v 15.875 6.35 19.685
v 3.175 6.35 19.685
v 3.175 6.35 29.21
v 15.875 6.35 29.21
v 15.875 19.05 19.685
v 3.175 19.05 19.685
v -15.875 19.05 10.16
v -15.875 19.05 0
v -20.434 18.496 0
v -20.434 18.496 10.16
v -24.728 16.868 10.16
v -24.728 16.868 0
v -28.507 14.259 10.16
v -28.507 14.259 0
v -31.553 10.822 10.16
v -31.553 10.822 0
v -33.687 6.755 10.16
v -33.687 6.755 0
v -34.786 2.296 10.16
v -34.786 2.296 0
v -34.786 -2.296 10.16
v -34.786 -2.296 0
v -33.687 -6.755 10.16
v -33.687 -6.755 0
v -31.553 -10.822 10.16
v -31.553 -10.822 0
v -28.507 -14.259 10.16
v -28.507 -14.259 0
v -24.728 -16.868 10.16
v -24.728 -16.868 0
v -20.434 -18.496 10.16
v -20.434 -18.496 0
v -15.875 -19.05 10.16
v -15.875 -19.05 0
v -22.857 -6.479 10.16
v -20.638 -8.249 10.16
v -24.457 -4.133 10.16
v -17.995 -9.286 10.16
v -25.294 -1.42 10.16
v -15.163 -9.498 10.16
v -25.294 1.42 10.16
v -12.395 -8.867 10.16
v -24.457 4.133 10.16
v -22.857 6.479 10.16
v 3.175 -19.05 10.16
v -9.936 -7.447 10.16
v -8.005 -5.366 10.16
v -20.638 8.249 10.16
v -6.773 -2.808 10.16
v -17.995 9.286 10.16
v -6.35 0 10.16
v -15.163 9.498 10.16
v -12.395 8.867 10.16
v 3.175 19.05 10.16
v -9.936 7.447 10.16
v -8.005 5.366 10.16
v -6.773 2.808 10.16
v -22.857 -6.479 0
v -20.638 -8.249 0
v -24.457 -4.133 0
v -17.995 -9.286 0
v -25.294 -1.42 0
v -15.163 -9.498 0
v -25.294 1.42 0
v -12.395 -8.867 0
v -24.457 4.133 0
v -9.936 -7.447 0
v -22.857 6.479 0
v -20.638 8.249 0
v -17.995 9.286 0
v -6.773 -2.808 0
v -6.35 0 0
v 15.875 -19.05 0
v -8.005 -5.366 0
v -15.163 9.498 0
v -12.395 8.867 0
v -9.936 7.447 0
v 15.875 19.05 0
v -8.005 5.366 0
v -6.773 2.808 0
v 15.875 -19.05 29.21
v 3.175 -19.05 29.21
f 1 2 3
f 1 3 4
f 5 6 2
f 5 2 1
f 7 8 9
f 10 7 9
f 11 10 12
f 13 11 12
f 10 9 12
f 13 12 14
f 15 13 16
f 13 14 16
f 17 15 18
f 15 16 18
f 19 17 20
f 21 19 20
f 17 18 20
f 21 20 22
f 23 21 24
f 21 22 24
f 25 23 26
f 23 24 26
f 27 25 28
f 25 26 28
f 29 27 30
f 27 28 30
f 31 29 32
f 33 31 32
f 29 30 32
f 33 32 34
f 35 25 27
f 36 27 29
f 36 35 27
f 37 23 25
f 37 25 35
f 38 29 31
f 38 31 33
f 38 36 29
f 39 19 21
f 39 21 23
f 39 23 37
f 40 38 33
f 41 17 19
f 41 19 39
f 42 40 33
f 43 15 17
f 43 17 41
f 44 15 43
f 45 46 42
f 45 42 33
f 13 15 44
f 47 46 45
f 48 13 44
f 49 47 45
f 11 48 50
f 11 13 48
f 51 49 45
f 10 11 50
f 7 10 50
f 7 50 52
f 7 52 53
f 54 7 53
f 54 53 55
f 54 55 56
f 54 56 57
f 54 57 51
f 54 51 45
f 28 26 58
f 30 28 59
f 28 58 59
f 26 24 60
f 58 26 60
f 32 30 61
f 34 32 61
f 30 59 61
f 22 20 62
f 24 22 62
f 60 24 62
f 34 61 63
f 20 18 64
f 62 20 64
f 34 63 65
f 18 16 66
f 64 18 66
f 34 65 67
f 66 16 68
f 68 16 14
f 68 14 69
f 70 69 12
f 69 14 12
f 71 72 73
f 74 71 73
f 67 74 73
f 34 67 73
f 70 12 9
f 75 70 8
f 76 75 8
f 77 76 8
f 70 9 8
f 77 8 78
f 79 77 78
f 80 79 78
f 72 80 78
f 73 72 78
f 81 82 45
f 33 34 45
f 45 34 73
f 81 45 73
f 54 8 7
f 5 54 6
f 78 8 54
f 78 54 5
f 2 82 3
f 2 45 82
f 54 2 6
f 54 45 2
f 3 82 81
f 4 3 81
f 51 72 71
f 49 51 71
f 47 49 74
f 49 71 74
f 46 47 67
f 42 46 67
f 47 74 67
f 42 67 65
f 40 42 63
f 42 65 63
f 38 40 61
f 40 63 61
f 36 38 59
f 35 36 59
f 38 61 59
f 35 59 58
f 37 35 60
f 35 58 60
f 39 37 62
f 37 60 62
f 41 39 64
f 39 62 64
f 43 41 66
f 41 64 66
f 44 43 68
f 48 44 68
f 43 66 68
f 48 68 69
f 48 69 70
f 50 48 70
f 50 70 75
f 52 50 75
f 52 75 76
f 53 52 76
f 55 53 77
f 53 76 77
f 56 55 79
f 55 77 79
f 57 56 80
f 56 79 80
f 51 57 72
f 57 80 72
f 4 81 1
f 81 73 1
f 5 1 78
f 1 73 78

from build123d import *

# Parameters (mm, degrees)
F1_DEPTH = 10.16
F2_W     = 12.7
F2_H     = 25.4
F3_DEPTH = 15.24
F4_W     = 12.7
F4_H     = 12.7
F5_DEPTH = 9.525
F6_DEPTH = 3.81


with BuildPart() as f1:
    # F0 (on Top) → F1 (new body)
    with BuildSketch(Plane.XY):
        with BuildLine():
            Line((15.875, -19.05), (15.875, 19.05))
            Line((15.875, 19.05), (-15.875, 19.05))
            ThreePointArc((-15.875, 19.05), (-2.4046158184, 13.4703841816), (3.175, 0))
            ThreePointArc((3.175, 0), (-2.4046158184, -13.4703841816), (-15.875, -19.05))
            Line((-15.875, -19.05), (15.875, -19.05))
        make_face()
        with BuildLine():
            ThreePointArc((3.175, 0), (-2.4046158184, 13.4703841816), (-15.875, 19.05))
            Line((-15.875, 19.05), (-15.875, 9.525))
            ThreePointArc((-15.875, 9.525), (-9.1398079092, 6.7351920908), (-6.35, 0))
            ThreePointArc((-6.35, 0), (-9.1398079092, -6.7351920908), (-15.875, -9.525))
            Line((-15.875, -9.525), (-15.875, -19.05))
            ThreePointArc((-15.875, -19.05), (-2.4046158184, -13.4703841816), (3.175, 0))
        make_face()
        with BuildLine():
            Line((-15.875, 9.525), (-15.875, 19.05))
            ThreePointArc((-15.875, 19.05), (-34.925, 0), (-15.875, -19.05))
            Line((-15.875, -19.05), (-15.875, -9.525))
            ThreePointArc((-15.875, -9.525), (-25.4, 0), (-15.875, 9.525))
        make_face()
    extrude(amount=F1_DEPTH)

    # F2 (on face) → F3 (join)
    with BuildSketch(Plane.XY.offset(10.16)):
        with Locations((9.525, -6.35)):
            Rectangle(F2_W, F2_H)
    extrude(amount=F3_DEPTH)

    # F4 (on face) → F5 (join)
    with BuildSketch(Plane.XY.offset(10.16)):
        with Locations((9.525, 12.7)):
            Rectangle(F4_W, F4_H)
    extrude(amount=F5_DEPTH)

    # F6 (add): a face of the model
    f6_faces = [f1.faces().sort_by_distance(p)[0] for p in [
        (9.525, -6.35, 25.4),
    ]]
    extrude(f6_faces, amount=F6_DEPTH)


solid = f1.part
